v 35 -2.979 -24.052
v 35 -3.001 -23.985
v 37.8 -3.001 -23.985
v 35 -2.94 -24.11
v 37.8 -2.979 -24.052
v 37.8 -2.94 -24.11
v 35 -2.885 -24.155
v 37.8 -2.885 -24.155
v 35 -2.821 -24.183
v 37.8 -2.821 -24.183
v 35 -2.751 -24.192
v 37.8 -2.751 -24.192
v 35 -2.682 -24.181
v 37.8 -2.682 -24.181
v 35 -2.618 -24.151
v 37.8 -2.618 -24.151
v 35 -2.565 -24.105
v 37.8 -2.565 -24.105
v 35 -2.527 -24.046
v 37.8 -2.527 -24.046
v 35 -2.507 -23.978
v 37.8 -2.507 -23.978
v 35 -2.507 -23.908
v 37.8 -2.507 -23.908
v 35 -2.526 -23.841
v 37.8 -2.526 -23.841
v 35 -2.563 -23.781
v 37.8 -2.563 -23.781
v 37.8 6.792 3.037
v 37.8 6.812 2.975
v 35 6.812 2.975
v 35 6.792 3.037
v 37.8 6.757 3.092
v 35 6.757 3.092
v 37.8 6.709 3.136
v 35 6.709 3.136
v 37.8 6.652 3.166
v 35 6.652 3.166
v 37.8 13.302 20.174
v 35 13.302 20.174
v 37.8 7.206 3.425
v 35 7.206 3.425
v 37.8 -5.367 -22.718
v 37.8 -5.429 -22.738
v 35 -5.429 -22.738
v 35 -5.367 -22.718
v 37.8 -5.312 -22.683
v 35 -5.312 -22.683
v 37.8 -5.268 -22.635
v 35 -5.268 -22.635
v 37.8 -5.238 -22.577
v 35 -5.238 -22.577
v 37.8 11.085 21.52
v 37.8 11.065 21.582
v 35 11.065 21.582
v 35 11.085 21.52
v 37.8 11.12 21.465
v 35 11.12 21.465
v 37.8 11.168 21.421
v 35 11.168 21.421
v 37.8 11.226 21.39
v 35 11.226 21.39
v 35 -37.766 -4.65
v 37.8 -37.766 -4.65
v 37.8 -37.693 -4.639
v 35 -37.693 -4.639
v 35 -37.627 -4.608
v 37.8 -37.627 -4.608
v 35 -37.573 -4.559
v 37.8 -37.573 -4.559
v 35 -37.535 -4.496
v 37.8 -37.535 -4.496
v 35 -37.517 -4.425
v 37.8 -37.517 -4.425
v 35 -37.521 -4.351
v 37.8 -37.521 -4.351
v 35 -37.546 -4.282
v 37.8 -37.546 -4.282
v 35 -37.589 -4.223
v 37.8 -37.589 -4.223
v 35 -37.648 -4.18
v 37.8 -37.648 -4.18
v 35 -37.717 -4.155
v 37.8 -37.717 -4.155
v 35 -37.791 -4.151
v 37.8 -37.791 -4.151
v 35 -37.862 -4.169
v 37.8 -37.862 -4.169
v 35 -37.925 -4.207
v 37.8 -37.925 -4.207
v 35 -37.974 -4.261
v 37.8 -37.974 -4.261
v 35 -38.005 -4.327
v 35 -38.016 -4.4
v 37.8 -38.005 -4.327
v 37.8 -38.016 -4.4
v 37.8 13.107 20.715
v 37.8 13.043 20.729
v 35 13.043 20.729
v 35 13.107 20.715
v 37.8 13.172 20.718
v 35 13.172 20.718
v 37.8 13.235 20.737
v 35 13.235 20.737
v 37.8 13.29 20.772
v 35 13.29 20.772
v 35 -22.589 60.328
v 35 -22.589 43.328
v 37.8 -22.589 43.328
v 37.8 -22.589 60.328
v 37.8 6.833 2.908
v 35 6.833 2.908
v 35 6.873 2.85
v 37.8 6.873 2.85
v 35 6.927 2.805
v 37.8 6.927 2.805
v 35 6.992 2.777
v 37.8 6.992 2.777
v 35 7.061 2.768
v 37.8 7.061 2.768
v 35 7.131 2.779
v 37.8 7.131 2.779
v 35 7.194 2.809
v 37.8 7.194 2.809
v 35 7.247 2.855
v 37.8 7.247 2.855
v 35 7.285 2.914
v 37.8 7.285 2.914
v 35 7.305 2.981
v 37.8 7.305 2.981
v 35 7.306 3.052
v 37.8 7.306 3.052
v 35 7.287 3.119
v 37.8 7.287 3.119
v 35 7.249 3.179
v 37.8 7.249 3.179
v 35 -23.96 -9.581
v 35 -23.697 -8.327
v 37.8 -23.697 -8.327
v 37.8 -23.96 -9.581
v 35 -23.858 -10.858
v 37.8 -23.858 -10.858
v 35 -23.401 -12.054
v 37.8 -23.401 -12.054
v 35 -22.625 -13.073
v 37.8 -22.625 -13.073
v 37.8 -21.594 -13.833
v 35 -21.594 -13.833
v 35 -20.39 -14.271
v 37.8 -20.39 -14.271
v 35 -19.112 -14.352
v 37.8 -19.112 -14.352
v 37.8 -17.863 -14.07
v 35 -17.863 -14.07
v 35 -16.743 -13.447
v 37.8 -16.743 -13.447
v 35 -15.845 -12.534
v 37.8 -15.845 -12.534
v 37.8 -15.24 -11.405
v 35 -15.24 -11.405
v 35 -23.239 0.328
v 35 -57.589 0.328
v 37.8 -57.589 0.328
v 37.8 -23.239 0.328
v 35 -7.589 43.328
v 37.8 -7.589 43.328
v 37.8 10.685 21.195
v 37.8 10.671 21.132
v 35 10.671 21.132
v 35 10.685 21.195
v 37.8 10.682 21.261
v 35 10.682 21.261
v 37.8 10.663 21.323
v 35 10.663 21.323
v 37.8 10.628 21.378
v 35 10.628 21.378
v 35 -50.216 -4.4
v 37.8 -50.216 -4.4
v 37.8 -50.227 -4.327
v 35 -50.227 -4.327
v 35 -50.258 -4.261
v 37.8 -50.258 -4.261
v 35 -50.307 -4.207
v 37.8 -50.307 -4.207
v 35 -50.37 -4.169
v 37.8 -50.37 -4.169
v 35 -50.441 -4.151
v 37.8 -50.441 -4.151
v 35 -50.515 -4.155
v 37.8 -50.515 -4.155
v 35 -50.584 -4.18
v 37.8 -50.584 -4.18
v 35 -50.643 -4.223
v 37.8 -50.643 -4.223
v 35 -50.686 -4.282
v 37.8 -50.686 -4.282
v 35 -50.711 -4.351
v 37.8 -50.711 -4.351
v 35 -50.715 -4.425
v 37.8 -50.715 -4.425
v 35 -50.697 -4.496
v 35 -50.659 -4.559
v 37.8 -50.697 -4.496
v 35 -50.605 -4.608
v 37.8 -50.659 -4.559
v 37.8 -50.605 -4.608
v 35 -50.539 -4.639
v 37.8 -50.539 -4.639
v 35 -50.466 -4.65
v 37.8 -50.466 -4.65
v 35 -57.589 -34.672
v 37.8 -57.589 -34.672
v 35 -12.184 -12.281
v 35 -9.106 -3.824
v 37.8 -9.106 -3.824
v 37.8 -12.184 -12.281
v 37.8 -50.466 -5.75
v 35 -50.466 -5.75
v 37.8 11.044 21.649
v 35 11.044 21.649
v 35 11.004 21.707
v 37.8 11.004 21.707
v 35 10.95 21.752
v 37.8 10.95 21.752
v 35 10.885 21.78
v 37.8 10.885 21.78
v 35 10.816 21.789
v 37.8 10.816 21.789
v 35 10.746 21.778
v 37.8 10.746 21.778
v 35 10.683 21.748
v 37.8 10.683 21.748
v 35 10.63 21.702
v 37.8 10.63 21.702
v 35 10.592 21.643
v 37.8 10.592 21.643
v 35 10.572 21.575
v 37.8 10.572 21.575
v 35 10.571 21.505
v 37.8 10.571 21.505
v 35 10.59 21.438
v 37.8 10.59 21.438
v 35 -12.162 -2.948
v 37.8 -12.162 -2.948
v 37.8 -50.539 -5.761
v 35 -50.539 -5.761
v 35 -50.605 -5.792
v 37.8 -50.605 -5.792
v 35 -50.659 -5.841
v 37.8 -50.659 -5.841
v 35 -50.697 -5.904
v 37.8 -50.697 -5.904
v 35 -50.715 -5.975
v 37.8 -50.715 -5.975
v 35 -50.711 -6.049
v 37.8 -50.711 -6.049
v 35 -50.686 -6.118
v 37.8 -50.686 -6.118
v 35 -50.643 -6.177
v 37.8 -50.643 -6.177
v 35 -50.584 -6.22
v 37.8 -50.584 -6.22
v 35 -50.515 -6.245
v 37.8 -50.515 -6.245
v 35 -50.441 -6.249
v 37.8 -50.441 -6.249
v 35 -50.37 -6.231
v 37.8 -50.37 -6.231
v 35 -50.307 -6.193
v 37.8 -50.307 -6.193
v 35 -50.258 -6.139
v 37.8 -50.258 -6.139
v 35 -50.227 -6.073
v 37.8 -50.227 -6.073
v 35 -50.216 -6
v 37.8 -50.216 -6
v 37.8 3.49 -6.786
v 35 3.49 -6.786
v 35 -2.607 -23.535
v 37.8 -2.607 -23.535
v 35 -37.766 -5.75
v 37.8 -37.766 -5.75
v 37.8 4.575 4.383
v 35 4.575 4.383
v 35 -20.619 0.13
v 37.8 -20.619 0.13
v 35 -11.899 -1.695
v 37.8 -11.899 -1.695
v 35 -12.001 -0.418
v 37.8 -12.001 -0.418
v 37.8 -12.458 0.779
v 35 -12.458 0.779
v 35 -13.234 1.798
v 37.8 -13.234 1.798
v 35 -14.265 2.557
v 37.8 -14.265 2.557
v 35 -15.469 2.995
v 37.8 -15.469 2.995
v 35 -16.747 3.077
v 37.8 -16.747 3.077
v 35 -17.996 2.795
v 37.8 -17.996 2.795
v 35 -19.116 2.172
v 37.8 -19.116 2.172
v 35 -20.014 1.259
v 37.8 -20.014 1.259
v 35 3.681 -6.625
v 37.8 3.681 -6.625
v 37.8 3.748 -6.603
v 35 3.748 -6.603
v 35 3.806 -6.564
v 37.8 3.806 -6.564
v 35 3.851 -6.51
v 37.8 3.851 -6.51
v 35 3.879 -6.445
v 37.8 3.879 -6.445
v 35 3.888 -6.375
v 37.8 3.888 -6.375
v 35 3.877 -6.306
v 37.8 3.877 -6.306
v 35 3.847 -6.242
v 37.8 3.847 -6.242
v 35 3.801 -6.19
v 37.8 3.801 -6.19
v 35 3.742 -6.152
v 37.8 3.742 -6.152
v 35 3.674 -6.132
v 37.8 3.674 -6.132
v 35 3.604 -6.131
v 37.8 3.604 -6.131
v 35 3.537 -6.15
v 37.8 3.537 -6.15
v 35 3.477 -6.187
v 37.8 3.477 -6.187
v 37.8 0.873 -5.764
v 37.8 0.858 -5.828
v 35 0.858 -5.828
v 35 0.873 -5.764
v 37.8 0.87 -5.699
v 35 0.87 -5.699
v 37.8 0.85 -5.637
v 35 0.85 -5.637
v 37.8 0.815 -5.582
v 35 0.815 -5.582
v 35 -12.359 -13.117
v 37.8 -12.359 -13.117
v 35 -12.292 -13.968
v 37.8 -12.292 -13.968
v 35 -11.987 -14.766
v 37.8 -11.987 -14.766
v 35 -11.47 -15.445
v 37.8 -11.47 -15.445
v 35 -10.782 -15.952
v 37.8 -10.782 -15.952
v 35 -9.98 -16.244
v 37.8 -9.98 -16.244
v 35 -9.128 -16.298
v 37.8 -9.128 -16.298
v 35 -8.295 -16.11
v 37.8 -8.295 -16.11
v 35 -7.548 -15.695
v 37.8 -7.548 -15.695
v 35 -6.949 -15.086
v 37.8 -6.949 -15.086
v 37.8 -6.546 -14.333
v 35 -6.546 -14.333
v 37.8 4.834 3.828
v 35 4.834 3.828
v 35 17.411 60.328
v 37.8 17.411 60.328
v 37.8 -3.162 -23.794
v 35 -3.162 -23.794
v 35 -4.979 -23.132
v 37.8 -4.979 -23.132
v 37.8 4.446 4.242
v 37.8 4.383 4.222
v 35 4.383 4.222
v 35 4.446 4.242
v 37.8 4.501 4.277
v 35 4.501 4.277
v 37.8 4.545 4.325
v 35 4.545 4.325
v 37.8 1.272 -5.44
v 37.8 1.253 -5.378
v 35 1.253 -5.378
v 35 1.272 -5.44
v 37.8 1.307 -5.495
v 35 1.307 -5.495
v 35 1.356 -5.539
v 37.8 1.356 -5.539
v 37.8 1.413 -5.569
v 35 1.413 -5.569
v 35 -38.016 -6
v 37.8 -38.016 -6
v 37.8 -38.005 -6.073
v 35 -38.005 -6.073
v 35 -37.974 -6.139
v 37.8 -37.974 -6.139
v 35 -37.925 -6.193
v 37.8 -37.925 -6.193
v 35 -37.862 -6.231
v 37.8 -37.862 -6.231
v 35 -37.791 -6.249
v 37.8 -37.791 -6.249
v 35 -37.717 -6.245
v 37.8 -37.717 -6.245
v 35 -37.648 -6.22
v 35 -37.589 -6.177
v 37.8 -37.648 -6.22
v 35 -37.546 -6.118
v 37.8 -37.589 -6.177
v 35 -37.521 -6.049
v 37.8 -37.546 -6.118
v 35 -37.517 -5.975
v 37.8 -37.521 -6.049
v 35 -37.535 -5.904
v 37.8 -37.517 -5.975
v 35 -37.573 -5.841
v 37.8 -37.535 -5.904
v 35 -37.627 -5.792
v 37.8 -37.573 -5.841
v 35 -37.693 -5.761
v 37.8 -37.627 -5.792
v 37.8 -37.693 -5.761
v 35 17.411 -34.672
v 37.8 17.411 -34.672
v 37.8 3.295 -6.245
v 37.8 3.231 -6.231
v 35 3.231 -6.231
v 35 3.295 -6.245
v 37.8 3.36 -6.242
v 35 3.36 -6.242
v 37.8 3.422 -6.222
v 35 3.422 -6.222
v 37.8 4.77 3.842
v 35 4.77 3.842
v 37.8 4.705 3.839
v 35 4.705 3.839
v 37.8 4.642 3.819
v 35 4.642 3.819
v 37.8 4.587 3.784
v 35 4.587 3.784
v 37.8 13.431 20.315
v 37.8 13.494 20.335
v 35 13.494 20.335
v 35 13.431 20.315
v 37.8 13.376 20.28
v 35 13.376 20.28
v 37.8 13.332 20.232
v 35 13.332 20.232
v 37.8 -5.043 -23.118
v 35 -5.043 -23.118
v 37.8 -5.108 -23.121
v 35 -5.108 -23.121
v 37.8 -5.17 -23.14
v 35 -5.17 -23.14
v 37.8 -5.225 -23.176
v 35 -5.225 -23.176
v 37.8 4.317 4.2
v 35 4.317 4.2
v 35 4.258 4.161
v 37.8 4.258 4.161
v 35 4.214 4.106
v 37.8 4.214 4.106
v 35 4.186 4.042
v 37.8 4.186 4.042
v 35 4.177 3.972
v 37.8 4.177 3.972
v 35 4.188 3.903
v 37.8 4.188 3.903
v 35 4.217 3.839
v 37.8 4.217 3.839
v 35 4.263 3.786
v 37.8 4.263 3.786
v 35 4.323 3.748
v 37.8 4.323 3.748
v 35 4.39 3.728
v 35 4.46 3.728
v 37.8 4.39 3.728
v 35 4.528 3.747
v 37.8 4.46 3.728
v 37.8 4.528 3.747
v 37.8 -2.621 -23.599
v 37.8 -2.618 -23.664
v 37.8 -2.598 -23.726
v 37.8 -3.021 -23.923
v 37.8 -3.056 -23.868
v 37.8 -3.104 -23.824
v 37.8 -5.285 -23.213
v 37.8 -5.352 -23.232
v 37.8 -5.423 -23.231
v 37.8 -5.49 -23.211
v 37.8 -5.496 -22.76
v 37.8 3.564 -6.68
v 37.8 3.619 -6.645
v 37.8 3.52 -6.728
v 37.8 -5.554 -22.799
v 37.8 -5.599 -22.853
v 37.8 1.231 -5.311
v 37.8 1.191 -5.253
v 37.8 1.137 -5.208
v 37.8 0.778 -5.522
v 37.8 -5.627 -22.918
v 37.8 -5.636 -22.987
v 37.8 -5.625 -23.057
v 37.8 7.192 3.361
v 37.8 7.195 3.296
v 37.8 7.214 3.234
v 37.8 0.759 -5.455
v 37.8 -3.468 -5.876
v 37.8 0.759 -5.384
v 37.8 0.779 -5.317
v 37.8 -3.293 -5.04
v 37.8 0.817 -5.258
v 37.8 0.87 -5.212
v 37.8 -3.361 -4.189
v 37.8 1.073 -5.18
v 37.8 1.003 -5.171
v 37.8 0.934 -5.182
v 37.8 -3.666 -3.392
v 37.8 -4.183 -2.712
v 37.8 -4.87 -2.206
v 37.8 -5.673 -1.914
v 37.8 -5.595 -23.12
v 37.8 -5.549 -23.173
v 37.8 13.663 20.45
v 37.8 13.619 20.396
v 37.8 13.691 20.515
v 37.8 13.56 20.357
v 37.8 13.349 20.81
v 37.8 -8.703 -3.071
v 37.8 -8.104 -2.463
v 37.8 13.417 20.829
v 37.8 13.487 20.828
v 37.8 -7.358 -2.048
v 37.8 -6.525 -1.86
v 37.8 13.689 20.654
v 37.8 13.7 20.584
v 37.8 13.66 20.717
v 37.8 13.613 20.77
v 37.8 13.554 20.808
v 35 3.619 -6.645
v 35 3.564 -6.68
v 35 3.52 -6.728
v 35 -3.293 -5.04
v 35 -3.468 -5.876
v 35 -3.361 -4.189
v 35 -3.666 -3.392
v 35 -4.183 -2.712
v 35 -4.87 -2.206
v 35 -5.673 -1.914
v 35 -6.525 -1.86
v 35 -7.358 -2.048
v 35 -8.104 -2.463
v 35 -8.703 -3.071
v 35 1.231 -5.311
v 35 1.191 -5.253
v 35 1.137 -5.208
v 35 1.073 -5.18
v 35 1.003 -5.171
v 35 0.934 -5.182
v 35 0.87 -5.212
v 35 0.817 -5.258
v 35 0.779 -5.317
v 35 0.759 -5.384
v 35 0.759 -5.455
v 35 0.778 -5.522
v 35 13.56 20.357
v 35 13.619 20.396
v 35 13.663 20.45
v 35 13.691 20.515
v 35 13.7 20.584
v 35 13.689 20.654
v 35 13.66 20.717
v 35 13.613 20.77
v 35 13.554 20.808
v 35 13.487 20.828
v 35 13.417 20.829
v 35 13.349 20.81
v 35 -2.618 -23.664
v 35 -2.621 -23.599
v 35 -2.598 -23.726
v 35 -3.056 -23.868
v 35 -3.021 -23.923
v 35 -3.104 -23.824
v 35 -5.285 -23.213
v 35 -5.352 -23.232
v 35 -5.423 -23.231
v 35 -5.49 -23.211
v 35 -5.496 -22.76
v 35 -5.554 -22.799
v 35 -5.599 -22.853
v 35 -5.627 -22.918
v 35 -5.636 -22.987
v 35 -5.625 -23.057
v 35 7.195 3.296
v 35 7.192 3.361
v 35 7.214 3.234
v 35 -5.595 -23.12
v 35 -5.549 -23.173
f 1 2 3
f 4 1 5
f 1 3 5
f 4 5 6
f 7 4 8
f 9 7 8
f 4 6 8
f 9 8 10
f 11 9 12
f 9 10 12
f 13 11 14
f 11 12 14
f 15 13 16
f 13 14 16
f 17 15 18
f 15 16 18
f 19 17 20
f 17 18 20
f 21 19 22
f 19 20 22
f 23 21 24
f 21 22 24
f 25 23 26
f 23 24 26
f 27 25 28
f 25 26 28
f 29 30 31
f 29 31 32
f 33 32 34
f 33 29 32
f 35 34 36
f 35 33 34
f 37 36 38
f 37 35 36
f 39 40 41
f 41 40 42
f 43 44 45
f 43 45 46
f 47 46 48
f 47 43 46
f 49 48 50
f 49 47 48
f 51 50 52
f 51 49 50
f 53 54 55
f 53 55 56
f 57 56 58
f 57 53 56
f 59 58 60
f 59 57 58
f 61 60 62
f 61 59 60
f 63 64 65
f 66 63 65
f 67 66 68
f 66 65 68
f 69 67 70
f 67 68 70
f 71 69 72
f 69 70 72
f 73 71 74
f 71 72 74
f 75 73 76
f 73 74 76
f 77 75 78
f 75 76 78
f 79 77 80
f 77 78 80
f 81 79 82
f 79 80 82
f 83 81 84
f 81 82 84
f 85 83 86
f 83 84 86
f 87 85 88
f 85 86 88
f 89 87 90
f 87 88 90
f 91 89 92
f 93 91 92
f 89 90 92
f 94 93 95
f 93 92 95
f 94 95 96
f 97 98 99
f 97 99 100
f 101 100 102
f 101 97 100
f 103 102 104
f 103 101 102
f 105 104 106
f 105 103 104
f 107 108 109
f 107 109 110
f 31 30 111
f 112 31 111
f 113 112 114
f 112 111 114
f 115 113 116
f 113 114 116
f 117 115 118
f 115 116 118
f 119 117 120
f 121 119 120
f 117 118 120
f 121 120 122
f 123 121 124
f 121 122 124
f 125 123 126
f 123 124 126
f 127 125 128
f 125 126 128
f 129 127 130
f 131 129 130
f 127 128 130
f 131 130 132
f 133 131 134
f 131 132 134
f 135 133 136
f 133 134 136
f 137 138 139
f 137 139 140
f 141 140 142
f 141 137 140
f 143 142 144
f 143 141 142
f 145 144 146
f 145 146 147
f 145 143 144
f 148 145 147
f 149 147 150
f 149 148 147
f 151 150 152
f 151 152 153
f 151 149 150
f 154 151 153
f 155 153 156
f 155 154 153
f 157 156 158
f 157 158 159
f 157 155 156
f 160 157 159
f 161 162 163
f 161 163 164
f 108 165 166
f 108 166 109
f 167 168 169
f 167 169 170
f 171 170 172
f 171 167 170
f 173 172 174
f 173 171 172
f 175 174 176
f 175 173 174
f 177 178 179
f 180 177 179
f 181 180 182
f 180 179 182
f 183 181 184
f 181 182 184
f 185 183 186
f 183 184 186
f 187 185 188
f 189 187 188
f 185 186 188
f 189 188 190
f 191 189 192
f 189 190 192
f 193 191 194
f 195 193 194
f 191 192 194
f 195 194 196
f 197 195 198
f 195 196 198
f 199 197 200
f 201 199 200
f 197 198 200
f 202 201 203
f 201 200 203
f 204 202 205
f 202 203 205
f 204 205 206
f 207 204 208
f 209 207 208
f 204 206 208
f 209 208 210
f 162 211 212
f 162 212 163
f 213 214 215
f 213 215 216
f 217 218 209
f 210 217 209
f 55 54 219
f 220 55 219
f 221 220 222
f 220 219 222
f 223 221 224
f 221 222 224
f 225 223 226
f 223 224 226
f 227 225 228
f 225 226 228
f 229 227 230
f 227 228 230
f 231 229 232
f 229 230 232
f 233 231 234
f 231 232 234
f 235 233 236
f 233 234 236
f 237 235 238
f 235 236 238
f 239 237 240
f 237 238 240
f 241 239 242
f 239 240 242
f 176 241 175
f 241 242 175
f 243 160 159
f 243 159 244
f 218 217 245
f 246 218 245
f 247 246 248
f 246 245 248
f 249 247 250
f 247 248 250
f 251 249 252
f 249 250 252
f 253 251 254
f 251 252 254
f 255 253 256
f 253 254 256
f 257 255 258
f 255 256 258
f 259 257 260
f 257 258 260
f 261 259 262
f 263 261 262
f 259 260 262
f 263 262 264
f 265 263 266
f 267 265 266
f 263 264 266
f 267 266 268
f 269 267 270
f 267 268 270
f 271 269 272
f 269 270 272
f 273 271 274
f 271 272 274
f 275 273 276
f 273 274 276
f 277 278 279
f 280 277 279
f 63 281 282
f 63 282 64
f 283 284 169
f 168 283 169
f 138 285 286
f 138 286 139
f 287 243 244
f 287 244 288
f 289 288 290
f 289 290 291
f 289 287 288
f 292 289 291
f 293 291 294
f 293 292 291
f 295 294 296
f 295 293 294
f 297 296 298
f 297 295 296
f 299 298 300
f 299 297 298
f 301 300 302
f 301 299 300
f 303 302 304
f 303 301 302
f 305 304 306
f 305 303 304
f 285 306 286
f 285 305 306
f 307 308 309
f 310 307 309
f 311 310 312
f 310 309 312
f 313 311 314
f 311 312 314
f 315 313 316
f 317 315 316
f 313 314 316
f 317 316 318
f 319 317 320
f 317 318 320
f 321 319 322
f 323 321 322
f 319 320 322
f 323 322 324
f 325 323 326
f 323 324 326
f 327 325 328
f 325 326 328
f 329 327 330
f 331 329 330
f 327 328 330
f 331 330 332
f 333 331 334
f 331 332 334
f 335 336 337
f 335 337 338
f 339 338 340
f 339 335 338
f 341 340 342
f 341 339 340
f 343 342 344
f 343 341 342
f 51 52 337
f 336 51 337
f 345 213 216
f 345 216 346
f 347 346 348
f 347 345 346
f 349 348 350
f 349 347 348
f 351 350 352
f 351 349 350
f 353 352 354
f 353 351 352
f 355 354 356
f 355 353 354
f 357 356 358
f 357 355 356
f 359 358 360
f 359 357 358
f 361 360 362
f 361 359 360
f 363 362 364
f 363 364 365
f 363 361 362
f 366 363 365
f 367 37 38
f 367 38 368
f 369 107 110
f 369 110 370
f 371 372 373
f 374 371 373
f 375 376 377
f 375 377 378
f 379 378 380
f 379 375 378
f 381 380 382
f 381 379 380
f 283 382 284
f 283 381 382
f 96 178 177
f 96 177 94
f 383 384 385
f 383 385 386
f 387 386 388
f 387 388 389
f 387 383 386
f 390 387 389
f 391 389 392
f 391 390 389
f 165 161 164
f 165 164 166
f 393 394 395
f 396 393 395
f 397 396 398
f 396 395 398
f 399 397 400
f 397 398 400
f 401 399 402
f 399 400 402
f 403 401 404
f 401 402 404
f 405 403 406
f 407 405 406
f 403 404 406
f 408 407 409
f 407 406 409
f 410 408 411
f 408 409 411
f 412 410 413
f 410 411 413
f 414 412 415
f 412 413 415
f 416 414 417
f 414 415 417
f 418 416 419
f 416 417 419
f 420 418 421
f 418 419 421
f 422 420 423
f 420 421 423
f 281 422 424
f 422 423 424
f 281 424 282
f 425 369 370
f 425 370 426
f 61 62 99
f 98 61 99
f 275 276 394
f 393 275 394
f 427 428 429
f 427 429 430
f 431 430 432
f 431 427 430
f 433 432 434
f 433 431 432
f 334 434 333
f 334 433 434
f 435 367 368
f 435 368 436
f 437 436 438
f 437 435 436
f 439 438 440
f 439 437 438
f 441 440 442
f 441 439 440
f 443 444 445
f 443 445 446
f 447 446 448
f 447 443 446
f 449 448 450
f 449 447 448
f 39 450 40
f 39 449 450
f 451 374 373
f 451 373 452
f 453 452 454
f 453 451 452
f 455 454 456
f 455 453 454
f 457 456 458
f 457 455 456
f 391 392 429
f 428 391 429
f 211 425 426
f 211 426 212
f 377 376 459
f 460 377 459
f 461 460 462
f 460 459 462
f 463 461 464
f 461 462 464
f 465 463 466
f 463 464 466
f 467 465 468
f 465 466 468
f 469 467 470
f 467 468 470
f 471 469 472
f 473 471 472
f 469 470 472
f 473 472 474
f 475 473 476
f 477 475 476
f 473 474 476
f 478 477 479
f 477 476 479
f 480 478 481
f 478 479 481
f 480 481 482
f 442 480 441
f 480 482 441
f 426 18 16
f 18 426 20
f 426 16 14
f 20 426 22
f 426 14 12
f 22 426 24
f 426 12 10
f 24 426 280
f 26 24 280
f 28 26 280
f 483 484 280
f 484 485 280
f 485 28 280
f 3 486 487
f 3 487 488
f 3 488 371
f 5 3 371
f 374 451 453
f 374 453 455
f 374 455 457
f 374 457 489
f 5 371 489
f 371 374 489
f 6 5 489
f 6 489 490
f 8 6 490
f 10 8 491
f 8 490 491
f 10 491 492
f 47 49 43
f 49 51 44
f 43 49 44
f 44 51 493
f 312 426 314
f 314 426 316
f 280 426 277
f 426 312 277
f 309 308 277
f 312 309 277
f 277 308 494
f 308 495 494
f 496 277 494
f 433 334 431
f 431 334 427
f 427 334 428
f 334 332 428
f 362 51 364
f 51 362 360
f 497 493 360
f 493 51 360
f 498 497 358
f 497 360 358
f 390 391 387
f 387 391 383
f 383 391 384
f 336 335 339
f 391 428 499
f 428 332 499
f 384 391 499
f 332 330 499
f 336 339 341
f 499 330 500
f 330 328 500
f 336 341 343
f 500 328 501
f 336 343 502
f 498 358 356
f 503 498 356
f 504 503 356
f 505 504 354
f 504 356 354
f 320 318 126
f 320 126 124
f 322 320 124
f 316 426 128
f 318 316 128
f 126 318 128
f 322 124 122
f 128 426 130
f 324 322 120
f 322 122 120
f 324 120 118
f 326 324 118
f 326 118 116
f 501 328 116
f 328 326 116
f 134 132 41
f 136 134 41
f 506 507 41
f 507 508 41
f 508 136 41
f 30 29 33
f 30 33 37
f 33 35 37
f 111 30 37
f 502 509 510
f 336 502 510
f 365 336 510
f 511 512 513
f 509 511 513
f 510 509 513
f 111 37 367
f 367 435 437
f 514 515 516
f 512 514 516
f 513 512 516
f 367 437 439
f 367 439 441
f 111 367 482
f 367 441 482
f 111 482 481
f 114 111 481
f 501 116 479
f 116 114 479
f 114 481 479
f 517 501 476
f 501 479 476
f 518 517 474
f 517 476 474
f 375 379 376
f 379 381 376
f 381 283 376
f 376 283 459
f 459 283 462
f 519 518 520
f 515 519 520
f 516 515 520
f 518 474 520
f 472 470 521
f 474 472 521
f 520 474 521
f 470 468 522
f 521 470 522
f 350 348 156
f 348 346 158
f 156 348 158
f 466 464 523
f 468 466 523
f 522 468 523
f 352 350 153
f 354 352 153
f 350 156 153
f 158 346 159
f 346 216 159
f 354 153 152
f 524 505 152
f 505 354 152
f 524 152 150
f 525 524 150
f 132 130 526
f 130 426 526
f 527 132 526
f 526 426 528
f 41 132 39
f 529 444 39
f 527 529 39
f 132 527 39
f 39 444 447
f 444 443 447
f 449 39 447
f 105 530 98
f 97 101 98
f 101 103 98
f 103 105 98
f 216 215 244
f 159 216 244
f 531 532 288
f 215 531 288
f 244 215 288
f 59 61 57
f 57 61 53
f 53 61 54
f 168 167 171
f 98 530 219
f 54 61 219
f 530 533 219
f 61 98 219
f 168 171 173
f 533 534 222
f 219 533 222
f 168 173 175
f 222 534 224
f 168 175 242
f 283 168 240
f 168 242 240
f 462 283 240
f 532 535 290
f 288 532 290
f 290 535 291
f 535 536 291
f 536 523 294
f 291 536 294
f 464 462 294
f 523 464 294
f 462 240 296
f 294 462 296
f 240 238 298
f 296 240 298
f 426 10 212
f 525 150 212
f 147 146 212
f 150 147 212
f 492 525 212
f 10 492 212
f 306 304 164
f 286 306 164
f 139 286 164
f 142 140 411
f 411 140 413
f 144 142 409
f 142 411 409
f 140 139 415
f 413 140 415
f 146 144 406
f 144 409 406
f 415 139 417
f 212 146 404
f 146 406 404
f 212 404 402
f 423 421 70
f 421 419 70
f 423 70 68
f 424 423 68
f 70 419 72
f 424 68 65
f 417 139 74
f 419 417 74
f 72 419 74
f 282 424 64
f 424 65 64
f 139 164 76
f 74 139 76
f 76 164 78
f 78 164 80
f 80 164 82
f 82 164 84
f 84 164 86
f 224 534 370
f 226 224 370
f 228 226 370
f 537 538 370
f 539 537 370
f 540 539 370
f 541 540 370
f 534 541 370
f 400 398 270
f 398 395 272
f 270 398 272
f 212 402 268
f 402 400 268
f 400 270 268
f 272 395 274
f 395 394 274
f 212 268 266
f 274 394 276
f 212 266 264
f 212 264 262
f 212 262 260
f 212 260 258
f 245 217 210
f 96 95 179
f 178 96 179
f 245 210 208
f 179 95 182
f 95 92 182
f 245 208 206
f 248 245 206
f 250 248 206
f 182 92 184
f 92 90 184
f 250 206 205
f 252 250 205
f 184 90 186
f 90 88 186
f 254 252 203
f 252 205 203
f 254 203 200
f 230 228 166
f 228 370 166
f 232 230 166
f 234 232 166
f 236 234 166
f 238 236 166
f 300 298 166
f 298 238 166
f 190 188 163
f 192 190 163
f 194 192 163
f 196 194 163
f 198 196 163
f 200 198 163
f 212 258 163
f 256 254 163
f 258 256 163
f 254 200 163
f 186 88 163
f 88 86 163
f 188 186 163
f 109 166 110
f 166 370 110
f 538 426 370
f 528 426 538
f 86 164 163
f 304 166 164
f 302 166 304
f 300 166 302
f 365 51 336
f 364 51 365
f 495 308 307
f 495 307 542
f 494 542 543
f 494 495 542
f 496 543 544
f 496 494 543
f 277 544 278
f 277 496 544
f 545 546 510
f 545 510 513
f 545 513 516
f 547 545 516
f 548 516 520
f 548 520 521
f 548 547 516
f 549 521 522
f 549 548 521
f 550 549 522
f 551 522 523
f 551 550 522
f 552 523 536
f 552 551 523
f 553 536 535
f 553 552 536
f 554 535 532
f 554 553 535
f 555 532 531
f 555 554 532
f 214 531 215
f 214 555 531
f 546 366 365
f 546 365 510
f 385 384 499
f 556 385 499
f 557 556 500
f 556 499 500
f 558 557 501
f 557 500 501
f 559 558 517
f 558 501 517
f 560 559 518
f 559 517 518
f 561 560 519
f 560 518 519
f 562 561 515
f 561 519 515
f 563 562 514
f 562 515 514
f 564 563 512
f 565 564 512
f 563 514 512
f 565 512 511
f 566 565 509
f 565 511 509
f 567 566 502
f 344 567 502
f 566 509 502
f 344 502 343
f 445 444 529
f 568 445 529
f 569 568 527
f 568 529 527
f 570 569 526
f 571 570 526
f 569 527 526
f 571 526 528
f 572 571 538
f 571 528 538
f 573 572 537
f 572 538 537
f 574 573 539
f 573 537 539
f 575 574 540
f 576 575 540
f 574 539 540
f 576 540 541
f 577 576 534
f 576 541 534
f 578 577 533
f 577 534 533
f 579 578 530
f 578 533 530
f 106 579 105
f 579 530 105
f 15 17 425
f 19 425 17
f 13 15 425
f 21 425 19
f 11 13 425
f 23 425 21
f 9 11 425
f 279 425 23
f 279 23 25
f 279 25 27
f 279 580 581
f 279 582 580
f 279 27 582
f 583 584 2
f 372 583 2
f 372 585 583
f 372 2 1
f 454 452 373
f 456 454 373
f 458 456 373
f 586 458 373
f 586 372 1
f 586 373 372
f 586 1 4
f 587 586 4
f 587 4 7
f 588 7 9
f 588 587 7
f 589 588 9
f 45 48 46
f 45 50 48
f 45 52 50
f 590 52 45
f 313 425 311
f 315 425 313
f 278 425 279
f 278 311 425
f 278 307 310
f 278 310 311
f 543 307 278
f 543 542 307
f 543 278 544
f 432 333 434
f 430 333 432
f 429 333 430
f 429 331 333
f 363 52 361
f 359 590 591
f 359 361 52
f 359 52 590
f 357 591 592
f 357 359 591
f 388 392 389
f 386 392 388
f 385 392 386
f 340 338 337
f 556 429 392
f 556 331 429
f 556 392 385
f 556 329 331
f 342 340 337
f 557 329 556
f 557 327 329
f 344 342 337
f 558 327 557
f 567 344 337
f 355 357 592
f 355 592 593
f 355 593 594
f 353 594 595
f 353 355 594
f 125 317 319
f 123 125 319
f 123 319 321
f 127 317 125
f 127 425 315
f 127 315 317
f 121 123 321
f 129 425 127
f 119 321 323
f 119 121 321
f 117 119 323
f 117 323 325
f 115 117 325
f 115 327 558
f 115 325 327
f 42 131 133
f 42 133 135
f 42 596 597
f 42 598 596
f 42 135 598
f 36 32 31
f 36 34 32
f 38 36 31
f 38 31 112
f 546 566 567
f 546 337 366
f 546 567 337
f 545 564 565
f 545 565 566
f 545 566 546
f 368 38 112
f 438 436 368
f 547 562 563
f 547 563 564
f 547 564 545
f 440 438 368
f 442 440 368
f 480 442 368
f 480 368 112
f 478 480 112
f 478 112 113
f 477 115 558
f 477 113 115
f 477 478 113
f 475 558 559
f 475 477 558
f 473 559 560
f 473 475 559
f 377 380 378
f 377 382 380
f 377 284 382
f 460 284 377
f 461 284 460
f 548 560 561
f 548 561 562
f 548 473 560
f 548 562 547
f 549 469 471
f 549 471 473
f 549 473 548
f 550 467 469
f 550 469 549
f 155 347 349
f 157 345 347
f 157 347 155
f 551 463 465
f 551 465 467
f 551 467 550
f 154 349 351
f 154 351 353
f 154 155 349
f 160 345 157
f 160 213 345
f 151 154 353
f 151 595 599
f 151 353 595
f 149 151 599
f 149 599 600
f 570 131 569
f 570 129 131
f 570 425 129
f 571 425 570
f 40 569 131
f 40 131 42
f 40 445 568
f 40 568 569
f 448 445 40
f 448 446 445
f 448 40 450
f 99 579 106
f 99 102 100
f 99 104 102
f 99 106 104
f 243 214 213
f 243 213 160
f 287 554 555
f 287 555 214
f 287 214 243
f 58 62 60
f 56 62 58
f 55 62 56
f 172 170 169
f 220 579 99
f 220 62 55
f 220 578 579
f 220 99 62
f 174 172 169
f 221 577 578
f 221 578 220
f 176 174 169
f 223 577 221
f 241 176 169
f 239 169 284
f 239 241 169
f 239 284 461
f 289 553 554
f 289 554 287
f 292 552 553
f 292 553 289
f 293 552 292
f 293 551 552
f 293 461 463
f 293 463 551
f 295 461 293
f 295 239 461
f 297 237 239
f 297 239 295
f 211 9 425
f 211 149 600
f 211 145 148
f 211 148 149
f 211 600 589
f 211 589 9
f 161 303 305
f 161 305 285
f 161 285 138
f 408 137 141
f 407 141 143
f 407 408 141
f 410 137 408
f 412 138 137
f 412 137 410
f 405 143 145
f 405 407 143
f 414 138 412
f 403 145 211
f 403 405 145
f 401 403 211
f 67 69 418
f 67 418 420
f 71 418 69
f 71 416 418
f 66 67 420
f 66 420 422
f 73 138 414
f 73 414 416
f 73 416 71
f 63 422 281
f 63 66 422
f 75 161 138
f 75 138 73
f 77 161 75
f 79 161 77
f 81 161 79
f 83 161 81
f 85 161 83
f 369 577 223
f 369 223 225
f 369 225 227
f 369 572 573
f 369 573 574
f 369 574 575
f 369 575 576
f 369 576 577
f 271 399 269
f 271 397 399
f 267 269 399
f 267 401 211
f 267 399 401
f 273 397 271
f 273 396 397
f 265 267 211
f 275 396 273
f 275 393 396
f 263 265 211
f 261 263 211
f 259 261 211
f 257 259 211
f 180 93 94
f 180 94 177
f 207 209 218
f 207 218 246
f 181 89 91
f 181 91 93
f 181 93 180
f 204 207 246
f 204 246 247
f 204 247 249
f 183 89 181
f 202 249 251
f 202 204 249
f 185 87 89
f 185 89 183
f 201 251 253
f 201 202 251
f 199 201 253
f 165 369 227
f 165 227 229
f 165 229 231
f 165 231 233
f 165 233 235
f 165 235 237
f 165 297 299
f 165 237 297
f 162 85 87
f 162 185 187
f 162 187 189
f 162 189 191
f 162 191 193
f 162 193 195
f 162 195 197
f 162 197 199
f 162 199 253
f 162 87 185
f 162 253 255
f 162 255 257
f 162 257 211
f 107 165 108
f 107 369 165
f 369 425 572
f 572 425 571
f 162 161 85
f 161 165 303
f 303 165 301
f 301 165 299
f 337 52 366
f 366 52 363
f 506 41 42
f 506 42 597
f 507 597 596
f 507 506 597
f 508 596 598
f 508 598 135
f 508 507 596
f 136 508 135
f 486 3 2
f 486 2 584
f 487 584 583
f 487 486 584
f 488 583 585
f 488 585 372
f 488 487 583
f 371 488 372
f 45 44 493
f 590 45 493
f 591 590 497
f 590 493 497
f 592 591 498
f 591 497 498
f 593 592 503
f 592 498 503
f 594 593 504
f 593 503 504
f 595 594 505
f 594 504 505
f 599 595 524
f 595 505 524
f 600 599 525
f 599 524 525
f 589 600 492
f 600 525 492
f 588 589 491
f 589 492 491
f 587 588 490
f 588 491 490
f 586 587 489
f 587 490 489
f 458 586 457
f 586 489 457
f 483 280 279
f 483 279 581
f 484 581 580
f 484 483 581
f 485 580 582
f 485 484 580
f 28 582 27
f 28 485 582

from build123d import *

# Parameters (mm, degrees)
PAD001_DEPTH    = 2.8
POCKET005_DEPTH = 2.801
SKETCH021_W     = 12.7
SKETCH021_H     = 1.6
POCKET010_DEPTH = 2.801
SKETCH022_R     = 0.25
POCKET011_DEPTH = 2.801


with BuildPart() as part:
    # Sketch001 (on Face18 of ShapeBinder) → Pad001 (new body)
    with BuildSketch(Plane.YZ.offset(35)):
        Polygon((-22.588718, 60.327675), (17.411282, 60.327675), (17.411282, -34.672325), (-57.588718, -34.672325), (-57.588718, 0.327675), (-23.239438, 0.327675), (-7.588718, 43.327675), (-22.588718, 43.327675), align=None)
        with BuildLine():
            ThreePointArc((-12.161797, -2.94822), (-14.851323, 2.819487), (-20.61903, 0.129961))
            Line((-20.61903, 0.129961), (-23.697212, -8.327272))
            ThreePointArc((-23.697212, -8.327272), (-21.007685, -14.09498), (-15.239978, -11.405454))
            Line((-15.239978, -11.405454), (-12.161797, -2.94822))
        make_face(mode=Mode.SUBTRACT)
        with BuildLine():
            ThreePointArc((-3.468033, -5.876244), (-5.261051, -2.031105), (-9.106189, -3.824123))
            Line((-9.106189, -3.824123), (-12.18437, -12.281356))
            ThreePointArc((-12.18437, -12.281356), (-10.391353, -16.126495), (-6.546214, -14.333477))
            Line((-6.546214, -14.333477), (-3.468033, -5.876244))
        make_face(mode=Mode.SUBTRACT)
        Polygon((10.819102, 21.538585), (13.450241, 20.580929), (7.057884, 3.018073), (4.426745, 3.97573), align=None, mode=Mode.SUBTRACT)
        Polygon((1.006544, -5.421196), (3.637683, -6.378853), (-2.754673, -23.941708), (-5.385813, -22.984051), align=None, mode=Mode.SUBTRACT)
    extrude(amount=PAD001_DEPTH)

    # Sketch013 (on Face26 of Pad001) → Pocket005 (cut, through all)
    with BuildSketch(Plane.YZ.offset(37.8)):
        with BuildLine():
            ThreePointArc((1.252746, -5.377784), (0.900889, -5.194619), (0.815033, -5.581893))
            ThreePointArc((0.858445, -5.828095), (0.869723, -5.699178), (0.815033, -5.581893))
            Line((0.858445, -5.828095), (1.413442, -5.569295))
            ThreePointArc((1.252746, -5.377784), (1.307436, -5.495069), (1.413442, -5.569295))
        make_face()
        with BuildLine():
            ThreePointArc((3.681095, -6.625055), (3.86426, -6.273198), (3.476986, -6.187342))
            ThreePointArc((3.230784, -6.230754), (3.359701, -6.242032), (3.476986, -6.187342))
            Line((3.489584, -6.785752), (3.230784, -6.230754))
            ThreePointArc((3.681095, -6.625055), (3.56381, -6.679746), (3.489584, -6.785752))
        make_face()
        with BuildLine():
            ThreePointArc((-5.429225, -22.737849), (-5.61239, -23.089706), (-5.225116, -23.175563))
            ThreePointArc((-4.978914, -23.13215), (-5.107831, -23.120872), (-5.225116, -23.175563))
            Line((-5.237714, -22.577153), (-4.978914, -23.13215))
            ThreePointArc((-5.429225, -22.737849), (-5.31194, -22.683159), (-5.237714, -22.577153))
        make_face()
        with BuildLine():
            ThreePointArc((-3.000875, -23.98512), (-2.649019, -24.168285), (-2.563162, -23.781011))
            ThreePointArc((-2.606574, -23.534809), (-2.617853, -23.663726), (-2.563162, -23.781011))
            Line((-2.606574, -23.534809), (-3.161572, -23.793609))
            ThreePointArc((-3.000875, -23.98512), (-3.055566, -23.867835), (-3.161572, -23.793609))
        make_face()
        with BuildLine():
            ThreePointArc((11.065304, 21.581997), (10.713447, 21.765162), (10.62759, 21.377888))
            ThreePointArc((10.671003, 21.131686), (10.682281, 21.260603), (10.62759, 21.377888))
            Line((10.671003, 21.131686), (11.226, 21.390486))
            ThreePointArc((11.065304, 21.581997), (11.119994, 21.464712), (11.226, 21.390486))
        make_face()
        with BuildLine():
            ThreePointArc((13.493653, 20.334727), (13.676818, 20.686583), (13.289544, 20.77244))
            ThreePointArc((13.043342, 20.729028), (13.172259, 20.717749), (13.289544, 20.77244))
            Line((13.302142, 20.17403), (13.043342, 20.729028))
            ThreePointArc((13.493653, 20.334727), (13.376368, 20.280036), (13.302142, 20.17403))
        make_face()
        with BuildLine():
            ThreePointArc((4.383333, 4.221932), (4.200168, 3.870075), (4.587442, 3.784219))
            ThreePointArc((4.833644, 3.827631), (4.704727, 3.83891), (4.587442, 3.784219))
            Line((4.574844, 4.382629), (4.833644, 3.827631))
            ThreePointArc((4.383333, 4.221932), (4.500618, 4.276623), (4.574844, 4.382629))
        make_face()
        with BuildLine():
            ThreePointArc((6.811682, 2.974661), (7.163539, 2.791497), (7.249396, 3.17877))
            ThreePointArc((7.205983, 3.424972), (7.194705, 3.296055), (7.249396, 3.17877))
            Line((7.205983, 3.424972), (6.650986, 3.166173))
            ThreePointArc((6.811682, 2.974661), (6.756992, 3.091946), (6.650986, 3.166173))
        make_face()
    extrude(amount=-POCKET005_DEPTH, mode=Mode.SUBTRACT)

    # Sketch021 (on Face5 of Pocket005) → Pocket010 (cut, through all)
    with BuildSketch(Plane.YZ.offset(37.8)):
        with Locations((-44.116, -5.2)):
            Rectangle(SKETCH021_W, SKETCH021_H)
    extrude(amount=-POCKET010_DEPTH, mode=Mode.SUBTRACT)

    # Sketch022 (on Face5 of Pocket010) → Pocket011 (cut, through all)
    with BuildSketch(Plane.YZ.offset(37.8)):
        with Locations((-50.466, -4.4)):
            Circle(SKETCH022_R)
        with Locations((-37.766, -4.4)):
            Circle(SKETCH022_R)
        with Locations((-37.766, -6)):
            Circle(SKETCH022_R)
        with Locations((-50.466, -6)):
            Circle(SKETCH022_R)
    extrude(amount=-POCKET011_DEPTH, mode=Mode.SUBTRACT)


solid = part.part
